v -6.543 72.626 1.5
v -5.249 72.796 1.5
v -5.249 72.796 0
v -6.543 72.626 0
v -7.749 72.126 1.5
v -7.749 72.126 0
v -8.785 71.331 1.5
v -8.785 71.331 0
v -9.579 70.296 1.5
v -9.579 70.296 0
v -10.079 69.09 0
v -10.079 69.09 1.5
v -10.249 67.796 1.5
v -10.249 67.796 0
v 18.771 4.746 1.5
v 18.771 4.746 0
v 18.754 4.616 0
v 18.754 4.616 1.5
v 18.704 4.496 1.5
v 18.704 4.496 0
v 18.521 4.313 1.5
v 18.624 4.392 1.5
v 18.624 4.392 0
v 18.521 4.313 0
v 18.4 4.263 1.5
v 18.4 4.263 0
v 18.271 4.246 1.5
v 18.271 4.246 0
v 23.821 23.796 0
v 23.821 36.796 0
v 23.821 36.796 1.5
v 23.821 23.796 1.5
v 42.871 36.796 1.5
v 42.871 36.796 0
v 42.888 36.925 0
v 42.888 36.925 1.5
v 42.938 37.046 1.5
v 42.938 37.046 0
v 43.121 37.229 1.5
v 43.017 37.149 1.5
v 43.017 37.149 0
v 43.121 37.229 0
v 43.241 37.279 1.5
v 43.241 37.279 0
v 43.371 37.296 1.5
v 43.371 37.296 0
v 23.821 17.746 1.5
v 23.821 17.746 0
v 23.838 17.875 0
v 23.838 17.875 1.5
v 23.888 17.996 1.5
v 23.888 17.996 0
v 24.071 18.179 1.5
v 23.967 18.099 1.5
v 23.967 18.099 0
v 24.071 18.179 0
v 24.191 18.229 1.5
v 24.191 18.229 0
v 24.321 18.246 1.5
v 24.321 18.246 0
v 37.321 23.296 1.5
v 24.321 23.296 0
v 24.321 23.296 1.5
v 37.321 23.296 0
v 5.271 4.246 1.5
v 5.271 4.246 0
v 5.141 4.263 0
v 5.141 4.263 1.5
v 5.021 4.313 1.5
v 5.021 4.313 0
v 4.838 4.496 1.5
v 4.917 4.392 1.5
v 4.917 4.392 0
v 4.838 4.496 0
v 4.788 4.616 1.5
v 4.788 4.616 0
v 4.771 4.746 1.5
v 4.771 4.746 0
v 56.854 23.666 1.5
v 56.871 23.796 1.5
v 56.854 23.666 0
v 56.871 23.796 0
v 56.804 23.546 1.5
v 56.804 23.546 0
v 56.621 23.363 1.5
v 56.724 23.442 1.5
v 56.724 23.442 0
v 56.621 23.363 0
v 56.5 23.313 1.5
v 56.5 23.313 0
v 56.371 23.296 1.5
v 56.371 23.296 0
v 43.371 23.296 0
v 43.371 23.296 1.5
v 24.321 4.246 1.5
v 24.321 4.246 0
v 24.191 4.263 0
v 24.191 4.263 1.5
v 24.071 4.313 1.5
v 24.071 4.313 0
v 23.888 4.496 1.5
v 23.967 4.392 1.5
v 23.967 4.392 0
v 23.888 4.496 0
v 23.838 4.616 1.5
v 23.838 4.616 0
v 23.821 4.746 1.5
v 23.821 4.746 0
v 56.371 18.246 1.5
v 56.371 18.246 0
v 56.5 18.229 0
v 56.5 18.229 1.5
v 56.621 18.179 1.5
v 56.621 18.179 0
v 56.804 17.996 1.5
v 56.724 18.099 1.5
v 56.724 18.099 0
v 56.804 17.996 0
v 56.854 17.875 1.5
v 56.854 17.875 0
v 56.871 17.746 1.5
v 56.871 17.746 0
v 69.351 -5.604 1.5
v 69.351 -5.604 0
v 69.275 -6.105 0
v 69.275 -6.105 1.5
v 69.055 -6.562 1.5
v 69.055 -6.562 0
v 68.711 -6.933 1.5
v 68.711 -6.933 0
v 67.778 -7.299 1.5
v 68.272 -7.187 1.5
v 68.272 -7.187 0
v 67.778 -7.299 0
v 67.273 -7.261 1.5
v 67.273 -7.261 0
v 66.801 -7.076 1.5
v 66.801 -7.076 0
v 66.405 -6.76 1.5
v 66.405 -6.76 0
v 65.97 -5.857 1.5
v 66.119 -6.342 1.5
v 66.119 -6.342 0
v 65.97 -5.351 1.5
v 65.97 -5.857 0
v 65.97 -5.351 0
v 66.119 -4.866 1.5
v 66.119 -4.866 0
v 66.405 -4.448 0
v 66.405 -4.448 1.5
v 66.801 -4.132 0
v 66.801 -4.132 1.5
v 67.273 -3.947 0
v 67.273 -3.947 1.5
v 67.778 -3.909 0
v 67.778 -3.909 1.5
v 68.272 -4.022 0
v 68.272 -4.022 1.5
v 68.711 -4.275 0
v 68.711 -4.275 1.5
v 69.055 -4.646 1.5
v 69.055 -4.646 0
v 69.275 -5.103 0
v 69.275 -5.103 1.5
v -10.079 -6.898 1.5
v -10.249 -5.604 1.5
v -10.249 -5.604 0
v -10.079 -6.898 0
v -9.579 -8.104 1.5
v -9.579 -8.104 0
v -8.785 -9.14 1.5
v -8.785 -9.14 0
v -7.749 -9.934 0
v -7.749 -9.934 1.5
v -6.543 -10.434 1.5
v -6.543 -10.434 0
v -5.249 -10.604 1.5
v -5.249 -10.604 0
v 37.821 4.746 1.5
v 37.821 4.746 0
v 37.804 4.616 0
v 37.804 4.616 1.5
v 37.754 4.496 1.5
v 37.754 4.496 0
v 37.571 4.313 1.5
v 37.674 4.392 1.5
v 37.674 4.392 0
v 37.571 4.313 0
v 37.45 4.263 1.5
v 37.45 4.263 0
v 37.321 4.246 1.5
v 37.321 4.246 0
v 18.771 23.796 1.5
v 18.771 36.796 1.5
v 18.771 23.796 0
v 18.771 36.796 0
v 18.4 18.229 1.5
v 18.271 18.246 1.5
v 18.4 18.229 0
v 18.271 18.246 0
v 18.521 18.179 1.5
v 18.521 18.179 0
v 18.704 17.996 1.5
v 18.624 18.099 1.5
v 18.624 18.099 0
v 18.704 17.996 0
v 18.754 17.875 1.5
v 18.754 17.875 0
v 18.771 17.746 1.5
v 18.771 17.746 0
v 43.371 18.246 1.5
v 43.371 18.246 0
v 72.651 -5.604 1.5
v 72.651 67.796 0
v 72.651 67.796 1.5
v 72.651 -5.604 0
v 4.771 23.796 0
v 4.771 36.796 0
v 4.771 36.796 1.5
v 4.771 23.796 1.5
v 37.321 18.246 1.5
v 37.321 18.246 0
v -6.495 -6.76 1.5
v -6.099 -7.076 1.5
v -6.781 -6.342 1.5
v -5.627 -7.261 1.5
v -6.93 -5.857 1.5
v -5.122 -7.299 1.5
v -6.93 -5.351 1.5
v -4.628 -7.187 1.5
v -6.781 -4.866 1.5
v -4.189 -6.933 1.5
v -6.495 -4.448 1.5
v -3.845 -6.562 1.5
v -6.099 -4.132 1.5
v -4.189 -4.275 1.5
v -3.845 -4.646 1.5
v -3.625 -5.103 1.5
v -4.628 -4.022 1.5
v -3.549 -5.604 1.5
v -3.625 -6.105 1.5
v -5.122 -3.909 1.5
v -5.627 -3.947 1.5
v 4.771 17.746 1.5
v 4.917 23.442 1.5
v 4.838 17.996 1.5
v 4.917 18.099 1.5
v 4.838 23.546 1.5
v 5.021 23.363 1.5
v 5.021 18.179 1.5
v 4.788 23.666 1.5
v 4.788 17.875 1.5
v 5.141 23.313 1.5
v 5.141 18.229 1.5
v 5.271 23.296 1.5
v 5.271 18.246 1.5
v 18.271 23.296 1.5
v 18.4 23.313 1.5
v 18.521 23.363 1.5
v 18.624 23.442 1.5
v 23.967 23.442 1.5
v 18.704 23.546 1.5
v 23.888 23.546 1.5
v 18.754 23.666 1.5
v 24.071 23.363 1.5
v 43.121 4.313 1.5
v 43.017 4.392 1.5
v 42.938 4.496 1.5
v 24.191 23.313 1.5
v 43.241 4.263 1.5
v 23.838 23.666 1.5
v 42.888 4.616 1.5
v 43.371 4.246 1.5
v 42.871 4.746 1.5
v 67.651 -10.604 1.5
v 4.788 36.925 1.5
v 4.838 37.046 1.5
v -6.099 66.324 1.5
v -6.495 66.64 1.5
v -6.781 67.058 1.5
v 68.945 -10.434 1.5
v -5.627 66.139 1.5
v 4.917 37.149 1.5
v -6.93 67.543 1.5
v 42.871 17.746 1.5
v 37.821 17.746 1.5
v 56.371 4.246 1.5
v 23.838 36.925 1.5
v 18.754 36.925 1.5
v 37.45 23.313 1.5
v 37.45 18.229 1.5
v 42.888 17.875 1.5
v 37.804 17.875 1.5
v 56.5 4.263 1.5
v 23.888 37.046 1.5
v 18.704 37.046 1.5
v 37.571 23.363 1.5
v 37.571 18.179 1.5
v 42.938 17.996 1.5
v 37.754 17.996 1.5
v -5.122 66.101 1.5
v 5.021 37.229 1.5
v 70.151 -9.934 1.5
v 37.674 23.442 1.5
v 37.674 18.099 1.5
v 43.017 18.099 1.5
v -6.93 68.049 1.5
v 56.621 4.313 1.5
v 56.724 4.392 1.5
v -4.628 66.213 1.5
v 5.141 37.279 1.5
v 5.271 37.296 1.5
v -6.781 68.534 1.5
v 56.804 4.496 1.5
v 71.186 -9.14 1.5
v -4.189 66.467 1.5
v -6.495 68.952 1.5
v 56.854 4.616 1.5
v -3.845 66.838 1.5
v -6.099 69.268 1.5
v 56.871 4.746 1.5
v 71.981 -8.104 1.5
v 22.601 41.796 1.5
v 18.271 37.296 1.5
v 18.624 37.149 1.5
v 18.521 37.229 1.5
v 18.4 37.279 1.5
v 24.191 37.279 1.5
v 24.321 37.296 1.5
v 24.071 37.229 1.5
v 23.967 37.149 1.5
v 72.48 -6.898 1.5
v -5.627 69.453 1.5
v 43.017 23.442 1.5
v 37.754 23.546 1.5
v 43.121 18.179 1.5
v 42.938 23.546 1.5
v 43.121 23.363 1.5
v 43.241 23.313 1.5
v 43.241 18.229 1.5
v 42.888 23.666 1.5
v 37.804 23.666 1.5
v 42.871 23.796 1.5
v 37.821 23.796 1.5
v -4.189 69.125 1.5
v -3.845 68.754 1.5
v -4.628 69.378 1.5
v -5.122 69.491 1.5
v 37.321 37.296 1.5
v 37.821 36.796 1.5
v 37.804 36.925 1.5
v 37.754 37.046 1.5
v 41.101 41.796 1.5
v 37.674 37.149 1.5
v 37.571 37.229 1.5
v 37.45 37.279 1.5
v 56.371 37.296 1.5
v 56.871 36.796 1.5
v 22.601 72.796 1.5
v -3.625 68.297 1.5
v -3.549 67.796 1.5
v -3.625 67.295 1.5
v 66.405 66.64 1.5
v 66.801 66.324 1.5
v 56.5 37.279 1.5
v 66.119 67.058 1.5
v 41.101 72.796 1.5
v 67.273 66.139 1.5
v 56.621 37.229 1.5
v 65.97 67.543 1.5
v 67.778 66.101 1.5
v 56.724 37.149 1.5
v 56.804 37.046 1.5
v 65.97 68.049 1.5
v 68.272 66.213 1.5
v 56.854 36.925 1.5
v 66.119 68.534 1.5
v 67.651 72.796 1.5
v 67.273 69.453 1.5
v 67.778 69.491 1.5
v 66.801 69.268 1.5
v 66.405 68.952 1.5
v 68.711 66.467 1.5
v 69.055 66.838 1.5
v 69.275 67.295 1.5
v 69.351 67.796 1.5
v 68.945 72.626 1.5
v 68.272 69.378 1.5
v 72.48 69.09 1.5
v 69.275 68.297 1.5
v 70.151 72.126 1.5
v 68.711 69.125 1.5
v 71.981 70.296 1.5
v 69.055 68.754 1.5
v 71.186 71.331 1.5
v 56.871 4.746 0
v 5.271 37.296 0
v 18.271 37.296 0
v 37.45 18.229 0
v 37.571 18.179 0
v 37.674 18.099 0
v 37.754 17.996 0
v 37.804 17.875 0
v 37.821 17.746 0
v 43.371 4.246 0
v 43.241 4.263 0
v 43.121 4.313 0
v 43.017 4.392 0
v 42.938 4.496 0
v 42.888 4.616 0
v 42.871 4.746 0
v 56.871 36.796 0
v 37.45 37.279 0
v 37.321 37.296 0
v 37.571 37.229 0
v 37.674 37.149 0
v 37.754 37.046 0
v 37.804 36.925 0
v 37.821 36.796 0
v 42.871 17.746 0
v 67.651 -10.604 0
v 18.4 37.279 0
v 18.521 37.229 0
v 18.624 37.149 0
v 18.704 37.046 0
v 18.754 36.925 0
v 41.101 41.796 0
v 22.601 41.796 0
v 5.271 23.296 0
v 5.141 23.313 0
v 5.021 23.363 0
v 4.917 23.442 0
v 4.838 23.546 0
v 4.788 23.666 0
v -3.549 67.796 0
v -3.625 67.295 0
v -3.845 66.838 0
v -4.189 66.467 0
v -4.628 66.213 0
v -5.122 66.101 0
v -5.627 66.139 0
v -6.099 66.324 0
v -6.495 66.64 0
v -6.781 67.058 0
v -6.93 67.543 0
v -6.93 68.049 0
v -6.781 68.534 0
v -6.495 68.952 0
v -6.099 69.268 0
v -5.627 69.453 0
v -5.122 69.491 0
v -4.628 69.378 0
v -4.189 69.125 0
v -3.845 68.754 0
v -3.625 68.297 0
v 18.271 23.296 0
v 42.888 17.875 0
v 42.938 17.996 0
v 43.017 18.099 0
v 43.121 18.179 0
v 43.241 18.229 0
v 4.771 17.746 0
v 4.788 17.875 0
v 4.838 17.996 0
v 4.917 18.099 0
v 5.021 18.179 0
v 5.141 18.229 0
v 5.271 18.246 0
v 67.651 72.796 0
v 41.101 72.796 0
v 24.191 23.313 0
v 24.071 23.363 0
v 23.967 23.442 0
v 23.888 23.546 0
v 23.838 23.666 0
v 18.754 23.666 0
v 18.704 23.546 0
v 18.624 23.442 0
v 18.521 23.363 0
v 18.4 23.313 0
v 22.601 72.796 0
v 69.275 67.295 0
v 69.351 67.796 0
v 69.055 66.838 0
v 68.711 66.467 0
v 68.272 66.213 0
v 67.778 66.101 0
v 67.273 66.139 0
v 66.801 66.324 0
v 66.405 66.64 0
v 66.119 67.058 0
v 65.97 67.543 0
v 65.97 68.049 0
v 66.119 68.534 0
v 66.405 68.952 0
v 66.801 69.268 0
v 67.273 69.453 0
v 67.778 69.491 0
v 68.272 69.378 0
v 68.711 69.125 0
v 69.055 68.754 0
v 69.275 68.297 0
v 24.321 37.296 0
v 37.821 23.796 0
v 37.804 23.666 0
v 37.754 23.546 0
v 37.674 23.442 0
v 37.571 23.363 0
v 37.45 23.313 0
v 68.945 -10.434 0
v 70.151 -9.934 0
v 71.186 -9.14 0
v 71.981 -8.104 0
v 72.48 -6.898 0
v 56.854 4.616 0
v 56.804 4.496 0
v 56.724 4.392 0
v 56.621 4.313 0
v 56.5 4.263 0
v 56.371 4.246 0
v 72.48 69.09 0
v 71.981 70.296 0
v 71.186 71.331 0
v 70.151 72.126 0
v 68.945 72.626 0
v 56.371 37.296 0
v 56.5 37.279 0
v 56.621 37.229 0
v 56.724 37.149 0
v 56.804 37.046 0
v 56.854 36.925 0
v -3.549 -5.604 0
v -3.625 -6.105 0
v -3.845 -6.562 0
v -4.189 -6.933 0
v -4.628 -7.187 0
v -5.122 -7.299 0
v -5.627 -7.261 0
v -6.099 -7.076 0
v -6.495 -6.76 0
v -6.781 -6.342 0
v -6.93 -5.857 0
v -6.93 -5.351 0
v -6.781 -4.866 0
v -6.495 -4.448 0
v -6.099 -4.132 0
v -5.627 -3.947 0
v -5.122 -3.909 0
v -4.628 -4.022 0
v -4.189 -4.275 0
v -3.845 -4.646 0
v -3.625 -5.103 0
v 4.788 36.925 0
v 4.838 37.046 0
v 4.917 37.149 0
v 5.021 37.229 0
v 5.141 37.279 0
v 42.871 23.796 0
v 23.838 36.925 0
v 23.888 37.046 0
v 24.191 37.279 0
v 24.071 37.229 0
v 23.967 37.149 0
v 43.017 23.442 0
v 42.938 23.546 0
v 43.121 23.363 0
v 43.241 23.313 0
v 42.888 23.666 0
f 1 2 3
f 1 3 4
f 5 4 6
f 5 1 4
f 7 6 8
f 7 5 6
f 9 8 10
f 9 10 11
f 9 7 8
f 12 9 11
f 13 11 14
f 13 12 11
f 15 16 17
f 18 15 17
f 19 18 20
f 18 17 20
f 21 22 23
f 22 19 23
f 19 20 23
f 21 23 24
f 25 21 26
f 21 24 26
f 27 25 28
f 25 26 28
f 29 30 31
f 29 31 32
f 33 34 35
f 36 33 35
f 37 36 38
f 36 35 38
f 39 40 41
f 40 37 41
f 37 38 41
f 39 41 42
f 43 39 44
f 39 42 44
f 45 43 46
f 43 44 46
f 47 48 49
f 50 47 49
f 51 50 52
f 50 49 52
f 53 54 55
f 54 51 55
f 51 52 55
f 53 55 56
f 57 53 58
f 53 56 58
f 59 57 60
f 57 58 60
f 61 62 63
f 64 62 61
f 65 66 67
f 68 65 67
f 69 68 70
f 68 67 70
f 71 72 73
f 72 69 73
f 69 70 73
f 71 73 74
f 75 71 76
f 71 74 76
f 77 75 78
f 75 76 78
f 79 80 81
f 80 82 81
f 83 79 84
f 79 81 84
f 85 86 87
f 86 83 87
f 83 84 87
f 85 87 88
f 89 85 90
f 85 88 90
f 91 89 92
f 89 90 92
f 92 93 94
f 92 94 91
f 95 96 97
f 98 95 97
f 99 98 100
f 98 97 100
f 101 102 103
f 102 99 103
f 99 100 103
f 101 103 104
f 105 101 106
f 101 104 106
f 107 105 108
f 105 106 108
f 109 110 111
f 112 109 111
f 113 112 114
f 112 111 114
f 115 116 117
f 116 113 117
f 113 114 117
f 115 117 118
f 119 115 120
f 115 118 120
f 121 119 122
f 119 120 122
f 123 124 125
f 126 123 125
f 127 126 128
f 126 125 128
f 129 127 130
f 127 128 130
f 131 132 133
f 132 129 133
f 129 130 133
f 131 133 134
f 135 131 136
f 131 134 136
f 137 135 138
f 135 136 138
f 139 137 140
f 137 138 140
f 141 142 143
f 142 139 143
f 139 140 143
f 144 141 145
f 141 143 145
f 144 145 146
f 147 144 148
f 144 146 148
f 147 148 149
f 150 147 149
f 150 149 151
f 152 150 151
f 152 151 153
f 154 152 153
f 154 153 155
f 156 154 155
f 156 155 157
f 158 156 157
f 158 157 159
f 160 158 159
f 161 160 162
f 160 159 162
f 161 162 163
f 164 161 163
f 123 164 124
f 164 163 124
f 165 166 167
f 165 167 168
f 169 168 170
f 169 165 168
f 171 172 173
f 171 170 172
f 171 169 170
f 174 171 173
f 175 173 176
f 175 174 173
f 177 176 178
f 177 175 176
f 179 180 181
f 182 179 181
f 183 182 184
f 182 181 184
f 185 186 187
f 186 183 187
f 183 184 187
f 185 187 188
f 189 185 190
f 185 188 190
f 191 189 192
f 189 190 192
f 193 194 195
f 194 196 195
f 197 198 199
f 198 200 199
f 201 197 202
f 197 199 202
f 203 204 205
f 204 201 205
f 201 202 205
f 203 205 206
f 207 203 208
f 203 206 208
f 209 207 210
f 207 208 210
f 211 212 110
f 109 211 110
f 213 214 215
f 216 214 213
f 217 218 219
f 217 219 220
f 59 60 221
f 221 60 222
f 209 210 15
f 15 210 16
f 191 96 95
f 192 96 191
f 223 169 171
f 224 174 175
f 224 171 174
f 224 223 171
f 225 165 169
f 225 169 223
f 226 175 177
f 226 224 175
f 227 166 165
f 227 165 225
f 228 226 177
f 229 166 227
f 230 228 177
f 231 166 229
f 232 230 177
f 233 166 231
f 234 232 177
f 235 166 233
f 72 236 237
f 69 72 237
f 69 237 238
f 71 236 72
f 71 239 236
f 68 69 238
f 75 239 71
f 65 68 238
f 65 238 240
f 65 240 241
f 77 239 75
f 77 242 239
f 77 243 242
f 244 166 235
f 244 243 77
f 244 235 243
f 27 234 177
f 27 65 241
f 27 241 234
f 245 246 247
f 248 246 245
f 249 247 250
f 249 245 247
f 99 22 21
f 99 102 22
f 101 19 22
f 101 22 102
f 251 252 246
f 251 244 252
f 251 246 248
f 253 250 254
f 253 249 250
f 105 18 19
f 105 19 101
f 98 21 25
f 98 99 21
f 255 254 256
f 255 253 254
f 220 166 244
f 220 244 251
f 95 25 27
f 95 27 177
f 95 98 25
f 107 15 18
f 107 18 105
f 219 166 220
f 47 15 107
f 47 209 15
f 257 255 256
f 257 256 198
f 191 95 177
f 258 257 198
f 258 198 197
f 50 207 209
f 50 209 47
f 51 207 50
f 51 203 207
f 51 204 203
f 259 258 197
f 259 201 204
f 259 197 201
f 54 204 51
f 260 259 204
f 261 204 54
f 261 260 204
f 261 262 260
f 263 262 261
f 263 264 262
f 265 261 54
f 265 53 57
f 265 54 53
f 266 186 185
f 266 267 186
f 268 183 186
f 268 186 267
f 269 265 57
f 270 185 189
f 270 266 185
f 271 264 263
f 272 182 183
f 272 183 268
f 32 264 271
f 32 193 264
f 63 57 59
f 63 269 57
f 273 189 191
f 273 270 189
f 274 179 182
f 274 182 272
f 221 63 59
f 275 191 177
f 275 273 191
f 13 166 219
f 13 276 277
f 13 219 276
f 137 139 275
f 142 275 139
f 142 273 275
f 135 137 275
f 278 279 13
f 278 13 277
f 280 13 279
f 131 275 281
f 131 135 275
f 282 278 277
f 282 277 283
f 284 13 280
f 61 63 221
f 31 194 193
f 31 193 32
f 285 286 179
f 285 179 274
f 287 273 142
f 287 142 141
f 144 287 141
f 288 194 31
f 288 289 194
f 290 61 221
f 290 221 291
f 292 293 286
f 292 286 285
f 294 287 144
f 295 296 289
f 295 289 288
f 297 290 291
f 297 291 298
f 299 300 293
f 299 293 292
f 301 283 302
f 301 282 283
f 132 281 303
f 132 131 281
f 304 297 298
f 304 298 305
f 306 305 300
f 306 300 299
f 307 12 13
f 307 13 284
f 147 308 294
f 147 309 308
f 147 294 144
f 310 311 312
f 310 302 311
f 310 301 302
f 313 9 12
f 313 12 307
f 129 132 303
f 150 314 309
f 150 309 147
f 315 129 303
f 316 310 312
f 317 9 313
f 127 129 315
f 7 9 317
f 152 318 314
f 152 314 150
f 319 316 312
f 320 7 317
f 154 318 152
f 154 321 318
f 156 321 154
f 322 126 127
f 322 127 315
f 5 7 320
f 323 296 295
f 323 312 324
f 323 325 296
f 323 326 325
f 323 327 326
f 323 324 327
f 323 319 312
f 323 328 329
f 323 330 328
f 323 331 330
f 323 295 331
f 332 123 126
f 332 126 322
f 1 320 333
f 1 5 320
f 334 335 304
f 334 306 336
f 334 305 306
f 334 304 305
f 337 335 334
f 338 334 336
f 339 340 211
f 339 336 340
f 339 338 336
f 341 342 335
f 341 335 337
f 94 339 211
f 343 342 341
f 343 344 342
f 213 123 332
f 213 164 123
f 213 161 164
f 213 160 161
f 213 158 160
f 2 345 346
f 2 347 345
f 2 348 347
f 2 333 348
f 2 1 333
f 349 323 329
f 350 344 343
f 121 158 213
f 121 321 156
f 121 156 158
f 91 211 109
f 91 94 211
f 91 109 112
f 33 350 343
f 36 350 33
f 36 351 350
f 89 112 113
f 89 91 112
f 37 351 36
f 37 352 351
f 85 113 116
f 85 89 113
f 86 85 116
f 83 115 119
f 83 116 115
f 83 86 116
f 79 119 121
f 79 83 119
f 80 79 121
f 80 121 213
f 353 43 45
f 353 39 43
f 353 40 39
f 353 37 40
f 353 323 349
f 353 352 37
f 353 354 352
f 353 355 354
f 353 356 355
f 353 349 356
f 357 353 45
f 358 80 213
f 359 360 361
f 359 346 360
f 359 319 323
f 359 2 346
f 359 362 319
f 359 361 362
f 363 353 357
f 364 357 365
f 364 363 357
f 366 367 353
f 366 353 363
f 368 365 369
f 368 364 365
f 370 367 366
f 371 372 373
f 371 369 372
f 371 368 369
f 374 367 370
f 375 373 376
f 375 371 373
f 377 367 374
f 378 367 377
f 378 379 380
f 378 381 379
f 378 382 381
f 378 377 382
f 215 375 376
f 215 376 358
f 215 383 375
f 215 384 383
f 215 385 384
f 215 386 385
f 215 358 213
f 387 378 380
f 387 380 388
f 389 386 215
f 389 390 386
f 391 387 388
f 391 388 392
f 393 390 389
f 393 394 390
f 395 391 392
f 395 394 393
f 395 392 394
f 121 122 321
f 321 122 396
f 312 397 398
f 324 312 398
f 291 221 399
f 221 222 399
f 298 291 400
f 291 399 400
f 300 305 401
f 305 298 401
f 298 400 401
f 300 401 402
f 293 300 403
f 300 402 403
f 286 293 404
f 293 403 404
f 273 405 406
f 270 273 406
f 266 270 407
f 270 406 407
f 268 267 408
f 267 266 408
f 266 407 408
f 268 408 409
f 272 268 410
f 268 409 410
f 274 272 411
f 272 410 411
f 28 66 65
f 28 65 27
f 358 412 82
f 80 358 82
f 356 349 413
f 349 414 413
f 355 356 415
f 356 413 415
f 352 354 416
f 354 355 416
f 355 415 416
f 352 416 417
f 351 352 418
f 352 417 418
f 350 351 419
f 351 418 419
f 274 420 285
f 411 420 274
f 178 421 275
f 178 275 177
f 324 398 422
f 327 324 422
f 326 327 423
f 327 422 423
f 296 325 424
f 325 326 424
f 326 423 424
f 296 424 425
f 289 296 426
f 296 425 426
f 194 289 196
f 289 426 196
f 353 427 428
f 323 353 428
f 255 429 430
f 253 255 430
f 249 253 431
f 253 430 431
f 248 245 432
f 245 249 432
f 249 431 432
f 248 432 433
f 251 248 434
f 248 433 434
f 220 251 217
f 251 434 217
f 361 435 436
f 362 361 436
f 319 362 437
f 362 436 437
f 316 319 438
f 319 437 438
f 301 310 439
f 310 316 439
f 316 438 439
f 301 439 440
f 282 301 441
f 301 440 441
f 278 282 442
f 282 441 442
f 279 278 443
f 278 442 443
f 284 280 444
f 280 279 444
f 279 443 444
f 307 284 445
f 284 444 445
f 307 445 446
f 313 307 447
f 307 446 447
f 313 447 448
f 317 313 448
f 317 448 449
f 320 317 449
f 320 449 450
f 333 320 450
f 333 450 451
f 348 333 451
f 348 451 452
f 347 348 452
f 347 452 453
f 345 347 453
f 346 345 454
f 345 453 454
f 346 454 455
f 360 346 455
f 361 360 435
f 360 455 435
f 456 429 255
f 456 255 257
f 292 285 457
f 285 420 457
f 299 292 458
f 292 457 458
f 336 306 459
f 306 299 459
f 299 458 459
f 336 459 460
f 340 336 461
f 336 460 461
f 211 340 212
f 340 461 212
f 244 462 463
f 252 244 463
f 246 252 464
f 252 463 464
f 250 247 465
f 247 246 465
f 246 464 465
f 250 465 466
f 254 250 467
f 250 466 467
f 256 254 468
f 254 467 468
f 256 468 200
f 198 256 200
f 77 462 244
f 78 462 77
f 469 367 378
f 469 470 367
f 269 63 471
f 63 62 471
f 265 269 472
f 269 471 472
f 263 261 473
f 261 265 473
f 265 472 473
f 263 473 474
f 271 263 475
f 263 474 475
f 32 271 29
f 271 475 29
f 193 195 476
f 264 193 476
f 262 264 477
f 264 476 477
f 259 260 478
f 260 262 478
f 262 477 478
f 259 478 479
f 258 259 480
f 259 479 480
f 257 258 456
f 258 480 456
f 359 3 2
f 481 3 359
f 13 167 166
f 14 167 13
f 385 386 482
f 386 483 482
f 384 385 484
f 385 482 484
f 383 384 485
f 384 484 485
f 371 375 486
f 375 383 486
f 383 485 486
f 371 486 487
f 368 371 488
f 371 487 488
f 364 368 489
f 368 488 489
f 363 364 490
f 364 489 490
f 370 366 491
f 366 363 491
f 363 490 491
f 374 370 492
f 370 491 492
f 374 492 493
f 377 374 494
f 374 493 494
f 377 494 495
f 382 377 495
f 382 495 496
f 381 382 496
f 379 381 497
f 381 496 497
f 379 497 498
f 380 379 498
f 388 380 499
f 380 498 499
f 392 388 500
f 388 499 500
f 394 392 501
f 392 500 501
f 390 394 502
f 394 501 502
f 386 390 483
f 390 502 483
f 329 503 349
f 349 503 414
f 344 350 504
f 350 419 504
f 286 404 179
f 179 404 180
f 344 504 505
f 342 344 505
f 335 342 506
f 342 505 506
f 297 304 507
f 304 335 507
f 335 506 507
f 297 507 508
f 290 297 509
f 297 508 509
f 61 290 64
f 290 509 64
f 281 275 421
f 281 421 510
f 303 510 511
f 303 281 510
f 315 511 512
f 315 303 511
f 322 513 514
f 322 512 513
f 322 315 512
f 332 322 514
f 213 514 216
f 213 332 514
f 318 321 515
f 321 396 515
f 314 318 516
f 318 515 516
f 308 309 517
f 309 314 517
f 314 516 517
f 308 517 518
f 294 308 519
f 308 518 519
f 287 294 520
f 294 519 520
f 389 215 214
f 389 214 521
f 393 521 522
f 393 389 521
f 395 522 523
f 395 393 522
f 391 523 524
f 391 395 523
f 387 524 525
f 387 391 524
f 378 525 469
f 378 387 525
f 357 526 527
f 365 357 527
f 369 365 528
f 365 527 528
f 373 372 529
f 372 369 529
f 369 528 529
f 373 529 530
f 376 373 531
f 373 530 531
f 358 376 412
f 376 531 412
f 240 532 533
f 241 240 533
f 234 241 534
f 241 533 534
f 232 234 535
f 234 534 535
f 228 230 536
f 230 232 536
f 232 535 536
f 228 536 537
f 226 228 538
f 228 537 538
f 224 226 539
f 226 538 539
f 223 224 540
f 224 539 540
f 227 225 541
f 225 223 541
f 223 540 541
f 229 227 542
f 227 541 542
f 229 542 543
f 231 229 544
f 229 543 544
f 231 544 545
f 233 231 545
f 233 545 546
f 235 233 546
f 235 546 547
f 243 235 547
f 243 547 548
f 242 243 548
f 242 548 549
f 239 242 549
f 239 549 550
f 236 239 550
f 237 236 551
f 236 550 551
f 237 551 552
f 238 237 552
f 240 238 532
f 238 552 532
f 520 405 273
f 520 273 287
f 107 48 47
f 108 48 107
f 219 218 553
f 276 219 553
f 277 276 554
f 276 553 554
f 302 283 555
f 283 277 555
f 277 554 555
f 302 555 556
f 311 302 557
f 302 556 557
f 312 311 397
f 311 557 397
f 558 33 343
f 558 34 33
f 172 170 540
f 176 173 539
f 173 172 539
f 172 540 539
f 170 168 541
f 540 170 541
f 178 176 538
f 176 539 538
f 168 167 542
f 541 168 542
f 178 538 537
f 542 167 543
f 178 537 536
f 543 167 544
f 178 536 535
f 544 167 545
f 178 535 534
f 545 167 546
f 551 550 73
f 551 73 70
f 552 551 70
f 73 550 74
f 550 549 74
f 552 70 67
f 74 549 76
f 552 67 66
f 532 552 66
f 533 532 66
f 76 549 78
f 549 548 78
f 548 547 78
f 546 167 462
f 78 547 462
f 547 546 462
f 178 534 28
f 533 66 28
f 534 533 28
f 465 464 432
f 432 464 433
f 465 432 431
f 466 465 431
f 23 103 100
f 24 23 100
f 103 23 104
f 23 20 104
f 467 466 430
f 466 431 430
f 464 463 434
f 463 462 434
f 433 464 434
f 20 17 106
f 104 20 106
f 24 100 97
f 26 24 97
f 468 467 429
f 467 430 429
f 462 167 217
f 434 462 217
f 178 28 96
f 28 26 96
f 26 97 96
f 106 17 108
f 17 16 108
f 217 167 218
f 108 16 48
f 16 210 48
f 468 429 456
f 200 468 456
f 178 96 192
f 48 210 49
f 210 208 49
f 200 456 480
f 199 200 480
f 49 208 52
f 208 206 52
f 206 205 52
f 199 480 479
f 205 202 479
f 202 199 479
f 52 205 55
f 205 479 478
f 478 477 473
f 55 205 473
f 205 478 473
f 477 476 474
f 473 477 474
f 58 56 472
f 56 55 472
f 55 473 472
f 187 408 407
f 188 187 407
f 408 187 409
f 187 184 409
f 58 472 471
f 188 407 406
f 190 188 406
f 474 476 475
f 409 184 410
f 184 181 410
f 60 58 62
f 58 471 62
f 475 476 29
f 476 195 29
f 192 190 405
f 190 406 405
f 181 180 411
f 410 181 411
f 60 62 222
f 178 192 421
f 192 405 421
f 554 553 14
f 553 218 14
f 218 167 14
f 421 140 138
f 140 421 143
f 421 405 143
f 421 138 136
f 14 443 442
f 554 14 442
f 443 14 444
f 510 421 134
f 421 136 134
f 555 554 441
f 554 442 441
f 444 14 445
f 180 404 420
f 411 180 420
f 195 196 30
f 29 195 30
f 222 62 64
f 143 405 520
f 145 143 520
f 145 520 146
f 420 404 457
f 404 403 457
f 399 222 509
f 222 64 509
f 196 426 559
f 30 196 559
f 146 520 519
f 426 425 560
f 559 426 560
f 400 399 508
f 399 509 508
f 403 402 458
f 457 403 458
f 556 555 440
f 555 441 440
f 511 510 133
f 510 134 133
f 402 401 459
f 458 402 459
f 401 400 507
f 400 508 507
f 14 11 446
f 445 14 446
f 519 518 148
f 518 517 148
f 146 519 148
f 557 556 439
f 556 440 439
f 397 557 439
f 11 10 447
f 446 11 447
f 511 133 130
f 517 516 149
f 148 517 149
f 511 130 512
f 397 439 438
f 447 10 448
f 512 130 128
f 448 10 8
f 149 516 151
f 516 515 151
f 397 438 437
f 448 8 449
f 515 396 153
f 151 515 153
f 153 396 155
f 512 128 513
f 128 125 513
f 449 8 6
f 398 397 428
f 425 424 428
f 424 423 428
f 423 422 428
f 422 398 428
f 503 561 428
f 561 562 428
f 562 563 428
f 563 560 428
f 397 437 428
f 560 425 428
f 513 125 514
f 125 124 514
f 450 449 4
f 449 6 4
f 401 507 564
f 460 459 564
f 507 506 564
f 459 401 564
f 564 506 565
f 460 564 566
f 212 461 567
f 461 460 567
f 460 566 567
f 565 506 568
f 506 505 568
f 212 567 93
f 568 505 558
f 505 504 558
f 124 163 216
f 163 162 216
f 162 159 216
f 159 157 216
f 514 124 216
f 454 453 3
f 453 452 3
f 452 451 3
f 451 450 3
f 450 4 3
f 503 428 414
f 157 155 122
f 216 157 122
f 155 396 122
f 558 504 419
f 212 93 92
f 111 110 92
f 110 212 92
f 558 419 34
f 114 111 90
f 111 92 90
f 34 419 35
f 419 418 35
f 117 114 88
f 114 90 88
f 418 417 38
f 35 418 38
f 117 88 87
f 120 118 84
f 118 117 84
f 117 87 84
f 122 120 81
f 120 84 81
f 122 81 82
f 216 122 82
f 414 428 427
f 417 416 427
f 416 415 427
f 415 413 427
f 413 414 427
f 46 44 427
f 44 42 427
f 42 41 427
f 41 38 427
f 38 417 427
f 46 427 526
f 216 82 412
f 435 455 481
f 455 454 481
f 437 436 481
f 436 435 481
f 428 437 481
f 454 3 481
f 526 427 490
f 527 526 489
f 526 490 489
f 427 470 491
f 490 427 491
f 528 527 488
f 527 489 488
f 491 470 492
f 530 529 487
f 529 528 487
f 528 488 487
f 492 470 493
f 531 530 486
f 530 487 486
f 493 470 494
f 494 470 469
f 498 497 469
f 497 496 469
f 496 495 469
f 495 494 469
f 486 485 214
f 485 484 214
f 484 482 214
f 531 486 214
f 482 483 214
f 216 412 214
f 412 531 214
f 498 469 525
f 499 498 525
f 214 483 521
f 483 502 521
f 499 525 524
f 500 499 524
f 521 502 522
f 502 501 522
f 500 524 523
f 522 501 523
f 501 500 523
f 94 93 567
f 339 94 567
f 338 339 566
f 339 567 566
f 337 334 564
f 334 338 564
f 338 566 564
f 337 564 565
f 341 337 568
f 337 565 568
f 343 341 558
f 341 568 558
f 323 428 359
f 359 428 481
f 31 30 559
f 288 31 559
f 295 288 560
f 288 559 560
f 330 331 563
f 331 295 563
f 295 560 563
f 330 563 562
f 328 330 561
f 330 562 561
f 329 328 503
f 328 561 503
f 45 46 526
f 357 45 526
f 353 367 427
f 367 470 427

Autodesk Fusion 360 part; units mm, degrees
sketch "plate-2025-12-30T20_28_05.150Z" plane through (0, 0, 0) normal (0, 0, 1) x (1, 0, 0)
  line L0 (5.2708, 37.2959) -> (18.2708, 37.2959)
  line L1 (5.2708, 23.2959) -> (18.2708, 23.2959)
  line L2 (4.7708, 36.7959) -> (4.7708, 23.7959)
  line L3 (18.7708, 36.7959) -> (18.7708, 23.7959)
  arc A0 (5.2708, 37.2959) -> (4.7708, 36.7959) centre (5.2708, 36.7959) ccw
  arc A1 (18.7708, 36.7959) -> (18.2708, 37.2959) centre (18.2708, 36.7959) ccw
  arc A2 (4.7708, 23.7959) -> (5.2708, 23.2959) centre (5.2708, 23.7959) ccw
  arc A3 (18.2708, 23.2959) -> (18.7708, 23.7959) centre (18.2708, 23.7959) ccw
  line L4 (24.3208, 37.2959) -> (37.3208, 37.2959)
  line L5 (24.3208, 23.2959) -> (37.3208, 23.2959)
  line L6 (23.8208, 36.7959) -> (23.8208, 23.7959)
  line L7 (37.8208, 36.7959) -> (37.8208, 23.7959)
  arc A4 (24.3208, 37.2959) -> (23.8208, 36.7959) centre (24.3208, 36.7959) ccw
  arc A5 (37.8208, 36.7959) -> (37.3208, 37.2959) centre (37.3208, 36.7959) ccw
  arc A6 (23.8208, 23.7959) -> (24.3208, 23.2959) centre (24.3208, 23.7959) ccw
  arc A7 (37.3208, 23.2959) -> (37.8208, 23.7959) centre (37.3208, 23.7959) ccw
  line L8 (43.3708, 37.2959) -> (56.3708, 37.2959)
  line L9 (43.3708, 23.2959) -> (56.3708, 23.2959)
  line L10 (42.8708, 36.7959) -> (42.8708, 23.7959)
  line L11 (56.8708, 36.7959) -> (56.8708, 23.7959)
  arc A8 (43.3708, 37.2959) -> (42.8708, 36.7959) centre (43.3708, 36.7959) ccw
  arc A9 (56.8708, 36.7959) -> (56.3708, 37.2959) centre (56.3708, 36.7959) ccw
  arc A10 (42.8708, 23.7959) -> (43.3708, 23.2959) centre (43.3708, 23.7959) ccw
  arc A11 (56.3708, 23.2959) -> (56.8708, 23.7959) centre (56.3708, 23.7959) ccw
  line L12 (5.2708, 18.2459) -> (18.2708, 18.2459)
  line L13 (5.2708, 4.2459) -> (18.2708, 4.2459)
  line L14 (4.7708, 17.7459) -> (4.7708, 4.7459)
  line L15 (18.7708, 17.7459) -> (18.7708, 4.7459)
  arc A12 (5.2708, 18.2459) -> (4.7708, 17.7459) centre (5.2708, 17.7459) ccw
  arc A13 (18.7708, 17.7459) -> (18.2708, 18.2459) centre (18.2708, 17.7459) ccw
  arc A14 (4.7708, 4.7459) -> (5.2708, 4.2459) centre (5.2708, 4.7459) ccw
  arc A15 (18.2708, 4.2459) -> (18.7708, 4.7459) centre (18.2708, 4.7459) ccw
  line L16 (24.3208, 18.2459) -> (37.3208, 18.2459)
  line L17 (24.3208, 4.2459) -> (37.3208, 4.2459)
  line L18 (23.8208, 17.7459) -> (23.8208, 4.7459)
  line L19 (37.8208, 17.7459) -> (37.8208, 4.7459)
  arc A16 (24.3208, 18.2459) -> (23.8208, 17.7459) centre (24.3208, 17.7459) ccw
  arc A17 (37.8208, 17.7459) -> (37.3208, 18.2459) centre (37.3208, 17.7459) ccw
  arc A18 (23.8208, 4.7459) -> (24.3208, 4.2459) centre (24.3208, 4.7459) ccw
  arc A19 (37.3208, 4.2459) -> (37.8208, 4.7459) centre (37.3208, 4.7459) ccw
  line L20 (43.3708, 18.2459) -> (56.3708, 18.2459)
  line L21 (43.3708, 4.2459) -> (56.3708, 4.2459)
  line L22 (42.8708, 17.7459) -> (42.8708, 4.7459)
  line L23 (56.8708, 17.7459) -> (56.8708, 4.7459)
  arc A20 (43.3708, 18.2459) -> (42.8708, 17.7459) centre (43.3708, 17.7459) ccw
  arc A21 (56.8708, 17.7459) -> (56.3708, 18.2459) centre (56.3708, 17.7459) ccw
  arc A22 (42.8708, 4.7459) -> (43.3708, 4.2459) centre (43.3708, 4.7459) ccw
  arc A23 (56.3708, 4.2459) -> (56.8708, 4.7459) centre (56.3708, 4.7459) ccw
  line L24 (-10.2492, 72.7959) -> (72.6508, 72.7959)
  line L25 (72.6508, 72.7959) -> (72.6508, -10.6041)
  line L26 (72.6508, -10.6041) -> (-10.2492, -10.6041)
  line L27 (-10.2492, -10.6041) -> (-10.2492, 72.7959)
  line L28 (22.6008, 72.7959) -> (41.1008, 72.7959)
  line L29 (41.1008, 72.7959) -> (41.1008, 41.7959)
  line L30 (41.1008, 41.7959) -> (22.6008, 41.7959)
  line L31 (22.6008, 41.7959) -> (22.6008, 72.7959)
  circle A24 centre (-5.2492, 67.7959) radius 1.7
  circle A25 centre (-5.2492, -5.6041) radius 1.7
  circle A26 centre (67.6508, -5.6041) radius 1.7
  circle A27 centre (67.6508, 67.7959) radius 1.7
  dimension "d1" = 82.9
  dimension "d2" = 83.4
  dimension "d3" = 15.02
  dimension "d4" = 14.85
  dimension "d5" = 18.5
  dimension "d6" = 31
  dimension "d7" = 32.85
  dimension "d8" = 3.4
  dimension "d9" = 5
  dimension "d10" = 5
  dimension "d11" = 3.4
  dimension "d12" = 5
  dimension "d13" = 5
  dimension "d14" = 3.4
  dimension "d15" = 5
  dimension "d16" = 5
  dimension "d17" = 3.4
  dimension "d18" = 5
  dimension "d19" = 5
extrude "Extrude1" add sketch "plate-2025-12-30T20_28_05.150Z" along normal blind 1.5 contours L24 L25 L26 L27 L29 L30 L31
fillet "Fillet1" radius 5 4 edges at (72.6508, -10.6041, 0.75) (72.6508, 72.7959, 0.75) (-10.2492, 72.7959, 0.75) (-10.2492, -10.6041, 0.75)
